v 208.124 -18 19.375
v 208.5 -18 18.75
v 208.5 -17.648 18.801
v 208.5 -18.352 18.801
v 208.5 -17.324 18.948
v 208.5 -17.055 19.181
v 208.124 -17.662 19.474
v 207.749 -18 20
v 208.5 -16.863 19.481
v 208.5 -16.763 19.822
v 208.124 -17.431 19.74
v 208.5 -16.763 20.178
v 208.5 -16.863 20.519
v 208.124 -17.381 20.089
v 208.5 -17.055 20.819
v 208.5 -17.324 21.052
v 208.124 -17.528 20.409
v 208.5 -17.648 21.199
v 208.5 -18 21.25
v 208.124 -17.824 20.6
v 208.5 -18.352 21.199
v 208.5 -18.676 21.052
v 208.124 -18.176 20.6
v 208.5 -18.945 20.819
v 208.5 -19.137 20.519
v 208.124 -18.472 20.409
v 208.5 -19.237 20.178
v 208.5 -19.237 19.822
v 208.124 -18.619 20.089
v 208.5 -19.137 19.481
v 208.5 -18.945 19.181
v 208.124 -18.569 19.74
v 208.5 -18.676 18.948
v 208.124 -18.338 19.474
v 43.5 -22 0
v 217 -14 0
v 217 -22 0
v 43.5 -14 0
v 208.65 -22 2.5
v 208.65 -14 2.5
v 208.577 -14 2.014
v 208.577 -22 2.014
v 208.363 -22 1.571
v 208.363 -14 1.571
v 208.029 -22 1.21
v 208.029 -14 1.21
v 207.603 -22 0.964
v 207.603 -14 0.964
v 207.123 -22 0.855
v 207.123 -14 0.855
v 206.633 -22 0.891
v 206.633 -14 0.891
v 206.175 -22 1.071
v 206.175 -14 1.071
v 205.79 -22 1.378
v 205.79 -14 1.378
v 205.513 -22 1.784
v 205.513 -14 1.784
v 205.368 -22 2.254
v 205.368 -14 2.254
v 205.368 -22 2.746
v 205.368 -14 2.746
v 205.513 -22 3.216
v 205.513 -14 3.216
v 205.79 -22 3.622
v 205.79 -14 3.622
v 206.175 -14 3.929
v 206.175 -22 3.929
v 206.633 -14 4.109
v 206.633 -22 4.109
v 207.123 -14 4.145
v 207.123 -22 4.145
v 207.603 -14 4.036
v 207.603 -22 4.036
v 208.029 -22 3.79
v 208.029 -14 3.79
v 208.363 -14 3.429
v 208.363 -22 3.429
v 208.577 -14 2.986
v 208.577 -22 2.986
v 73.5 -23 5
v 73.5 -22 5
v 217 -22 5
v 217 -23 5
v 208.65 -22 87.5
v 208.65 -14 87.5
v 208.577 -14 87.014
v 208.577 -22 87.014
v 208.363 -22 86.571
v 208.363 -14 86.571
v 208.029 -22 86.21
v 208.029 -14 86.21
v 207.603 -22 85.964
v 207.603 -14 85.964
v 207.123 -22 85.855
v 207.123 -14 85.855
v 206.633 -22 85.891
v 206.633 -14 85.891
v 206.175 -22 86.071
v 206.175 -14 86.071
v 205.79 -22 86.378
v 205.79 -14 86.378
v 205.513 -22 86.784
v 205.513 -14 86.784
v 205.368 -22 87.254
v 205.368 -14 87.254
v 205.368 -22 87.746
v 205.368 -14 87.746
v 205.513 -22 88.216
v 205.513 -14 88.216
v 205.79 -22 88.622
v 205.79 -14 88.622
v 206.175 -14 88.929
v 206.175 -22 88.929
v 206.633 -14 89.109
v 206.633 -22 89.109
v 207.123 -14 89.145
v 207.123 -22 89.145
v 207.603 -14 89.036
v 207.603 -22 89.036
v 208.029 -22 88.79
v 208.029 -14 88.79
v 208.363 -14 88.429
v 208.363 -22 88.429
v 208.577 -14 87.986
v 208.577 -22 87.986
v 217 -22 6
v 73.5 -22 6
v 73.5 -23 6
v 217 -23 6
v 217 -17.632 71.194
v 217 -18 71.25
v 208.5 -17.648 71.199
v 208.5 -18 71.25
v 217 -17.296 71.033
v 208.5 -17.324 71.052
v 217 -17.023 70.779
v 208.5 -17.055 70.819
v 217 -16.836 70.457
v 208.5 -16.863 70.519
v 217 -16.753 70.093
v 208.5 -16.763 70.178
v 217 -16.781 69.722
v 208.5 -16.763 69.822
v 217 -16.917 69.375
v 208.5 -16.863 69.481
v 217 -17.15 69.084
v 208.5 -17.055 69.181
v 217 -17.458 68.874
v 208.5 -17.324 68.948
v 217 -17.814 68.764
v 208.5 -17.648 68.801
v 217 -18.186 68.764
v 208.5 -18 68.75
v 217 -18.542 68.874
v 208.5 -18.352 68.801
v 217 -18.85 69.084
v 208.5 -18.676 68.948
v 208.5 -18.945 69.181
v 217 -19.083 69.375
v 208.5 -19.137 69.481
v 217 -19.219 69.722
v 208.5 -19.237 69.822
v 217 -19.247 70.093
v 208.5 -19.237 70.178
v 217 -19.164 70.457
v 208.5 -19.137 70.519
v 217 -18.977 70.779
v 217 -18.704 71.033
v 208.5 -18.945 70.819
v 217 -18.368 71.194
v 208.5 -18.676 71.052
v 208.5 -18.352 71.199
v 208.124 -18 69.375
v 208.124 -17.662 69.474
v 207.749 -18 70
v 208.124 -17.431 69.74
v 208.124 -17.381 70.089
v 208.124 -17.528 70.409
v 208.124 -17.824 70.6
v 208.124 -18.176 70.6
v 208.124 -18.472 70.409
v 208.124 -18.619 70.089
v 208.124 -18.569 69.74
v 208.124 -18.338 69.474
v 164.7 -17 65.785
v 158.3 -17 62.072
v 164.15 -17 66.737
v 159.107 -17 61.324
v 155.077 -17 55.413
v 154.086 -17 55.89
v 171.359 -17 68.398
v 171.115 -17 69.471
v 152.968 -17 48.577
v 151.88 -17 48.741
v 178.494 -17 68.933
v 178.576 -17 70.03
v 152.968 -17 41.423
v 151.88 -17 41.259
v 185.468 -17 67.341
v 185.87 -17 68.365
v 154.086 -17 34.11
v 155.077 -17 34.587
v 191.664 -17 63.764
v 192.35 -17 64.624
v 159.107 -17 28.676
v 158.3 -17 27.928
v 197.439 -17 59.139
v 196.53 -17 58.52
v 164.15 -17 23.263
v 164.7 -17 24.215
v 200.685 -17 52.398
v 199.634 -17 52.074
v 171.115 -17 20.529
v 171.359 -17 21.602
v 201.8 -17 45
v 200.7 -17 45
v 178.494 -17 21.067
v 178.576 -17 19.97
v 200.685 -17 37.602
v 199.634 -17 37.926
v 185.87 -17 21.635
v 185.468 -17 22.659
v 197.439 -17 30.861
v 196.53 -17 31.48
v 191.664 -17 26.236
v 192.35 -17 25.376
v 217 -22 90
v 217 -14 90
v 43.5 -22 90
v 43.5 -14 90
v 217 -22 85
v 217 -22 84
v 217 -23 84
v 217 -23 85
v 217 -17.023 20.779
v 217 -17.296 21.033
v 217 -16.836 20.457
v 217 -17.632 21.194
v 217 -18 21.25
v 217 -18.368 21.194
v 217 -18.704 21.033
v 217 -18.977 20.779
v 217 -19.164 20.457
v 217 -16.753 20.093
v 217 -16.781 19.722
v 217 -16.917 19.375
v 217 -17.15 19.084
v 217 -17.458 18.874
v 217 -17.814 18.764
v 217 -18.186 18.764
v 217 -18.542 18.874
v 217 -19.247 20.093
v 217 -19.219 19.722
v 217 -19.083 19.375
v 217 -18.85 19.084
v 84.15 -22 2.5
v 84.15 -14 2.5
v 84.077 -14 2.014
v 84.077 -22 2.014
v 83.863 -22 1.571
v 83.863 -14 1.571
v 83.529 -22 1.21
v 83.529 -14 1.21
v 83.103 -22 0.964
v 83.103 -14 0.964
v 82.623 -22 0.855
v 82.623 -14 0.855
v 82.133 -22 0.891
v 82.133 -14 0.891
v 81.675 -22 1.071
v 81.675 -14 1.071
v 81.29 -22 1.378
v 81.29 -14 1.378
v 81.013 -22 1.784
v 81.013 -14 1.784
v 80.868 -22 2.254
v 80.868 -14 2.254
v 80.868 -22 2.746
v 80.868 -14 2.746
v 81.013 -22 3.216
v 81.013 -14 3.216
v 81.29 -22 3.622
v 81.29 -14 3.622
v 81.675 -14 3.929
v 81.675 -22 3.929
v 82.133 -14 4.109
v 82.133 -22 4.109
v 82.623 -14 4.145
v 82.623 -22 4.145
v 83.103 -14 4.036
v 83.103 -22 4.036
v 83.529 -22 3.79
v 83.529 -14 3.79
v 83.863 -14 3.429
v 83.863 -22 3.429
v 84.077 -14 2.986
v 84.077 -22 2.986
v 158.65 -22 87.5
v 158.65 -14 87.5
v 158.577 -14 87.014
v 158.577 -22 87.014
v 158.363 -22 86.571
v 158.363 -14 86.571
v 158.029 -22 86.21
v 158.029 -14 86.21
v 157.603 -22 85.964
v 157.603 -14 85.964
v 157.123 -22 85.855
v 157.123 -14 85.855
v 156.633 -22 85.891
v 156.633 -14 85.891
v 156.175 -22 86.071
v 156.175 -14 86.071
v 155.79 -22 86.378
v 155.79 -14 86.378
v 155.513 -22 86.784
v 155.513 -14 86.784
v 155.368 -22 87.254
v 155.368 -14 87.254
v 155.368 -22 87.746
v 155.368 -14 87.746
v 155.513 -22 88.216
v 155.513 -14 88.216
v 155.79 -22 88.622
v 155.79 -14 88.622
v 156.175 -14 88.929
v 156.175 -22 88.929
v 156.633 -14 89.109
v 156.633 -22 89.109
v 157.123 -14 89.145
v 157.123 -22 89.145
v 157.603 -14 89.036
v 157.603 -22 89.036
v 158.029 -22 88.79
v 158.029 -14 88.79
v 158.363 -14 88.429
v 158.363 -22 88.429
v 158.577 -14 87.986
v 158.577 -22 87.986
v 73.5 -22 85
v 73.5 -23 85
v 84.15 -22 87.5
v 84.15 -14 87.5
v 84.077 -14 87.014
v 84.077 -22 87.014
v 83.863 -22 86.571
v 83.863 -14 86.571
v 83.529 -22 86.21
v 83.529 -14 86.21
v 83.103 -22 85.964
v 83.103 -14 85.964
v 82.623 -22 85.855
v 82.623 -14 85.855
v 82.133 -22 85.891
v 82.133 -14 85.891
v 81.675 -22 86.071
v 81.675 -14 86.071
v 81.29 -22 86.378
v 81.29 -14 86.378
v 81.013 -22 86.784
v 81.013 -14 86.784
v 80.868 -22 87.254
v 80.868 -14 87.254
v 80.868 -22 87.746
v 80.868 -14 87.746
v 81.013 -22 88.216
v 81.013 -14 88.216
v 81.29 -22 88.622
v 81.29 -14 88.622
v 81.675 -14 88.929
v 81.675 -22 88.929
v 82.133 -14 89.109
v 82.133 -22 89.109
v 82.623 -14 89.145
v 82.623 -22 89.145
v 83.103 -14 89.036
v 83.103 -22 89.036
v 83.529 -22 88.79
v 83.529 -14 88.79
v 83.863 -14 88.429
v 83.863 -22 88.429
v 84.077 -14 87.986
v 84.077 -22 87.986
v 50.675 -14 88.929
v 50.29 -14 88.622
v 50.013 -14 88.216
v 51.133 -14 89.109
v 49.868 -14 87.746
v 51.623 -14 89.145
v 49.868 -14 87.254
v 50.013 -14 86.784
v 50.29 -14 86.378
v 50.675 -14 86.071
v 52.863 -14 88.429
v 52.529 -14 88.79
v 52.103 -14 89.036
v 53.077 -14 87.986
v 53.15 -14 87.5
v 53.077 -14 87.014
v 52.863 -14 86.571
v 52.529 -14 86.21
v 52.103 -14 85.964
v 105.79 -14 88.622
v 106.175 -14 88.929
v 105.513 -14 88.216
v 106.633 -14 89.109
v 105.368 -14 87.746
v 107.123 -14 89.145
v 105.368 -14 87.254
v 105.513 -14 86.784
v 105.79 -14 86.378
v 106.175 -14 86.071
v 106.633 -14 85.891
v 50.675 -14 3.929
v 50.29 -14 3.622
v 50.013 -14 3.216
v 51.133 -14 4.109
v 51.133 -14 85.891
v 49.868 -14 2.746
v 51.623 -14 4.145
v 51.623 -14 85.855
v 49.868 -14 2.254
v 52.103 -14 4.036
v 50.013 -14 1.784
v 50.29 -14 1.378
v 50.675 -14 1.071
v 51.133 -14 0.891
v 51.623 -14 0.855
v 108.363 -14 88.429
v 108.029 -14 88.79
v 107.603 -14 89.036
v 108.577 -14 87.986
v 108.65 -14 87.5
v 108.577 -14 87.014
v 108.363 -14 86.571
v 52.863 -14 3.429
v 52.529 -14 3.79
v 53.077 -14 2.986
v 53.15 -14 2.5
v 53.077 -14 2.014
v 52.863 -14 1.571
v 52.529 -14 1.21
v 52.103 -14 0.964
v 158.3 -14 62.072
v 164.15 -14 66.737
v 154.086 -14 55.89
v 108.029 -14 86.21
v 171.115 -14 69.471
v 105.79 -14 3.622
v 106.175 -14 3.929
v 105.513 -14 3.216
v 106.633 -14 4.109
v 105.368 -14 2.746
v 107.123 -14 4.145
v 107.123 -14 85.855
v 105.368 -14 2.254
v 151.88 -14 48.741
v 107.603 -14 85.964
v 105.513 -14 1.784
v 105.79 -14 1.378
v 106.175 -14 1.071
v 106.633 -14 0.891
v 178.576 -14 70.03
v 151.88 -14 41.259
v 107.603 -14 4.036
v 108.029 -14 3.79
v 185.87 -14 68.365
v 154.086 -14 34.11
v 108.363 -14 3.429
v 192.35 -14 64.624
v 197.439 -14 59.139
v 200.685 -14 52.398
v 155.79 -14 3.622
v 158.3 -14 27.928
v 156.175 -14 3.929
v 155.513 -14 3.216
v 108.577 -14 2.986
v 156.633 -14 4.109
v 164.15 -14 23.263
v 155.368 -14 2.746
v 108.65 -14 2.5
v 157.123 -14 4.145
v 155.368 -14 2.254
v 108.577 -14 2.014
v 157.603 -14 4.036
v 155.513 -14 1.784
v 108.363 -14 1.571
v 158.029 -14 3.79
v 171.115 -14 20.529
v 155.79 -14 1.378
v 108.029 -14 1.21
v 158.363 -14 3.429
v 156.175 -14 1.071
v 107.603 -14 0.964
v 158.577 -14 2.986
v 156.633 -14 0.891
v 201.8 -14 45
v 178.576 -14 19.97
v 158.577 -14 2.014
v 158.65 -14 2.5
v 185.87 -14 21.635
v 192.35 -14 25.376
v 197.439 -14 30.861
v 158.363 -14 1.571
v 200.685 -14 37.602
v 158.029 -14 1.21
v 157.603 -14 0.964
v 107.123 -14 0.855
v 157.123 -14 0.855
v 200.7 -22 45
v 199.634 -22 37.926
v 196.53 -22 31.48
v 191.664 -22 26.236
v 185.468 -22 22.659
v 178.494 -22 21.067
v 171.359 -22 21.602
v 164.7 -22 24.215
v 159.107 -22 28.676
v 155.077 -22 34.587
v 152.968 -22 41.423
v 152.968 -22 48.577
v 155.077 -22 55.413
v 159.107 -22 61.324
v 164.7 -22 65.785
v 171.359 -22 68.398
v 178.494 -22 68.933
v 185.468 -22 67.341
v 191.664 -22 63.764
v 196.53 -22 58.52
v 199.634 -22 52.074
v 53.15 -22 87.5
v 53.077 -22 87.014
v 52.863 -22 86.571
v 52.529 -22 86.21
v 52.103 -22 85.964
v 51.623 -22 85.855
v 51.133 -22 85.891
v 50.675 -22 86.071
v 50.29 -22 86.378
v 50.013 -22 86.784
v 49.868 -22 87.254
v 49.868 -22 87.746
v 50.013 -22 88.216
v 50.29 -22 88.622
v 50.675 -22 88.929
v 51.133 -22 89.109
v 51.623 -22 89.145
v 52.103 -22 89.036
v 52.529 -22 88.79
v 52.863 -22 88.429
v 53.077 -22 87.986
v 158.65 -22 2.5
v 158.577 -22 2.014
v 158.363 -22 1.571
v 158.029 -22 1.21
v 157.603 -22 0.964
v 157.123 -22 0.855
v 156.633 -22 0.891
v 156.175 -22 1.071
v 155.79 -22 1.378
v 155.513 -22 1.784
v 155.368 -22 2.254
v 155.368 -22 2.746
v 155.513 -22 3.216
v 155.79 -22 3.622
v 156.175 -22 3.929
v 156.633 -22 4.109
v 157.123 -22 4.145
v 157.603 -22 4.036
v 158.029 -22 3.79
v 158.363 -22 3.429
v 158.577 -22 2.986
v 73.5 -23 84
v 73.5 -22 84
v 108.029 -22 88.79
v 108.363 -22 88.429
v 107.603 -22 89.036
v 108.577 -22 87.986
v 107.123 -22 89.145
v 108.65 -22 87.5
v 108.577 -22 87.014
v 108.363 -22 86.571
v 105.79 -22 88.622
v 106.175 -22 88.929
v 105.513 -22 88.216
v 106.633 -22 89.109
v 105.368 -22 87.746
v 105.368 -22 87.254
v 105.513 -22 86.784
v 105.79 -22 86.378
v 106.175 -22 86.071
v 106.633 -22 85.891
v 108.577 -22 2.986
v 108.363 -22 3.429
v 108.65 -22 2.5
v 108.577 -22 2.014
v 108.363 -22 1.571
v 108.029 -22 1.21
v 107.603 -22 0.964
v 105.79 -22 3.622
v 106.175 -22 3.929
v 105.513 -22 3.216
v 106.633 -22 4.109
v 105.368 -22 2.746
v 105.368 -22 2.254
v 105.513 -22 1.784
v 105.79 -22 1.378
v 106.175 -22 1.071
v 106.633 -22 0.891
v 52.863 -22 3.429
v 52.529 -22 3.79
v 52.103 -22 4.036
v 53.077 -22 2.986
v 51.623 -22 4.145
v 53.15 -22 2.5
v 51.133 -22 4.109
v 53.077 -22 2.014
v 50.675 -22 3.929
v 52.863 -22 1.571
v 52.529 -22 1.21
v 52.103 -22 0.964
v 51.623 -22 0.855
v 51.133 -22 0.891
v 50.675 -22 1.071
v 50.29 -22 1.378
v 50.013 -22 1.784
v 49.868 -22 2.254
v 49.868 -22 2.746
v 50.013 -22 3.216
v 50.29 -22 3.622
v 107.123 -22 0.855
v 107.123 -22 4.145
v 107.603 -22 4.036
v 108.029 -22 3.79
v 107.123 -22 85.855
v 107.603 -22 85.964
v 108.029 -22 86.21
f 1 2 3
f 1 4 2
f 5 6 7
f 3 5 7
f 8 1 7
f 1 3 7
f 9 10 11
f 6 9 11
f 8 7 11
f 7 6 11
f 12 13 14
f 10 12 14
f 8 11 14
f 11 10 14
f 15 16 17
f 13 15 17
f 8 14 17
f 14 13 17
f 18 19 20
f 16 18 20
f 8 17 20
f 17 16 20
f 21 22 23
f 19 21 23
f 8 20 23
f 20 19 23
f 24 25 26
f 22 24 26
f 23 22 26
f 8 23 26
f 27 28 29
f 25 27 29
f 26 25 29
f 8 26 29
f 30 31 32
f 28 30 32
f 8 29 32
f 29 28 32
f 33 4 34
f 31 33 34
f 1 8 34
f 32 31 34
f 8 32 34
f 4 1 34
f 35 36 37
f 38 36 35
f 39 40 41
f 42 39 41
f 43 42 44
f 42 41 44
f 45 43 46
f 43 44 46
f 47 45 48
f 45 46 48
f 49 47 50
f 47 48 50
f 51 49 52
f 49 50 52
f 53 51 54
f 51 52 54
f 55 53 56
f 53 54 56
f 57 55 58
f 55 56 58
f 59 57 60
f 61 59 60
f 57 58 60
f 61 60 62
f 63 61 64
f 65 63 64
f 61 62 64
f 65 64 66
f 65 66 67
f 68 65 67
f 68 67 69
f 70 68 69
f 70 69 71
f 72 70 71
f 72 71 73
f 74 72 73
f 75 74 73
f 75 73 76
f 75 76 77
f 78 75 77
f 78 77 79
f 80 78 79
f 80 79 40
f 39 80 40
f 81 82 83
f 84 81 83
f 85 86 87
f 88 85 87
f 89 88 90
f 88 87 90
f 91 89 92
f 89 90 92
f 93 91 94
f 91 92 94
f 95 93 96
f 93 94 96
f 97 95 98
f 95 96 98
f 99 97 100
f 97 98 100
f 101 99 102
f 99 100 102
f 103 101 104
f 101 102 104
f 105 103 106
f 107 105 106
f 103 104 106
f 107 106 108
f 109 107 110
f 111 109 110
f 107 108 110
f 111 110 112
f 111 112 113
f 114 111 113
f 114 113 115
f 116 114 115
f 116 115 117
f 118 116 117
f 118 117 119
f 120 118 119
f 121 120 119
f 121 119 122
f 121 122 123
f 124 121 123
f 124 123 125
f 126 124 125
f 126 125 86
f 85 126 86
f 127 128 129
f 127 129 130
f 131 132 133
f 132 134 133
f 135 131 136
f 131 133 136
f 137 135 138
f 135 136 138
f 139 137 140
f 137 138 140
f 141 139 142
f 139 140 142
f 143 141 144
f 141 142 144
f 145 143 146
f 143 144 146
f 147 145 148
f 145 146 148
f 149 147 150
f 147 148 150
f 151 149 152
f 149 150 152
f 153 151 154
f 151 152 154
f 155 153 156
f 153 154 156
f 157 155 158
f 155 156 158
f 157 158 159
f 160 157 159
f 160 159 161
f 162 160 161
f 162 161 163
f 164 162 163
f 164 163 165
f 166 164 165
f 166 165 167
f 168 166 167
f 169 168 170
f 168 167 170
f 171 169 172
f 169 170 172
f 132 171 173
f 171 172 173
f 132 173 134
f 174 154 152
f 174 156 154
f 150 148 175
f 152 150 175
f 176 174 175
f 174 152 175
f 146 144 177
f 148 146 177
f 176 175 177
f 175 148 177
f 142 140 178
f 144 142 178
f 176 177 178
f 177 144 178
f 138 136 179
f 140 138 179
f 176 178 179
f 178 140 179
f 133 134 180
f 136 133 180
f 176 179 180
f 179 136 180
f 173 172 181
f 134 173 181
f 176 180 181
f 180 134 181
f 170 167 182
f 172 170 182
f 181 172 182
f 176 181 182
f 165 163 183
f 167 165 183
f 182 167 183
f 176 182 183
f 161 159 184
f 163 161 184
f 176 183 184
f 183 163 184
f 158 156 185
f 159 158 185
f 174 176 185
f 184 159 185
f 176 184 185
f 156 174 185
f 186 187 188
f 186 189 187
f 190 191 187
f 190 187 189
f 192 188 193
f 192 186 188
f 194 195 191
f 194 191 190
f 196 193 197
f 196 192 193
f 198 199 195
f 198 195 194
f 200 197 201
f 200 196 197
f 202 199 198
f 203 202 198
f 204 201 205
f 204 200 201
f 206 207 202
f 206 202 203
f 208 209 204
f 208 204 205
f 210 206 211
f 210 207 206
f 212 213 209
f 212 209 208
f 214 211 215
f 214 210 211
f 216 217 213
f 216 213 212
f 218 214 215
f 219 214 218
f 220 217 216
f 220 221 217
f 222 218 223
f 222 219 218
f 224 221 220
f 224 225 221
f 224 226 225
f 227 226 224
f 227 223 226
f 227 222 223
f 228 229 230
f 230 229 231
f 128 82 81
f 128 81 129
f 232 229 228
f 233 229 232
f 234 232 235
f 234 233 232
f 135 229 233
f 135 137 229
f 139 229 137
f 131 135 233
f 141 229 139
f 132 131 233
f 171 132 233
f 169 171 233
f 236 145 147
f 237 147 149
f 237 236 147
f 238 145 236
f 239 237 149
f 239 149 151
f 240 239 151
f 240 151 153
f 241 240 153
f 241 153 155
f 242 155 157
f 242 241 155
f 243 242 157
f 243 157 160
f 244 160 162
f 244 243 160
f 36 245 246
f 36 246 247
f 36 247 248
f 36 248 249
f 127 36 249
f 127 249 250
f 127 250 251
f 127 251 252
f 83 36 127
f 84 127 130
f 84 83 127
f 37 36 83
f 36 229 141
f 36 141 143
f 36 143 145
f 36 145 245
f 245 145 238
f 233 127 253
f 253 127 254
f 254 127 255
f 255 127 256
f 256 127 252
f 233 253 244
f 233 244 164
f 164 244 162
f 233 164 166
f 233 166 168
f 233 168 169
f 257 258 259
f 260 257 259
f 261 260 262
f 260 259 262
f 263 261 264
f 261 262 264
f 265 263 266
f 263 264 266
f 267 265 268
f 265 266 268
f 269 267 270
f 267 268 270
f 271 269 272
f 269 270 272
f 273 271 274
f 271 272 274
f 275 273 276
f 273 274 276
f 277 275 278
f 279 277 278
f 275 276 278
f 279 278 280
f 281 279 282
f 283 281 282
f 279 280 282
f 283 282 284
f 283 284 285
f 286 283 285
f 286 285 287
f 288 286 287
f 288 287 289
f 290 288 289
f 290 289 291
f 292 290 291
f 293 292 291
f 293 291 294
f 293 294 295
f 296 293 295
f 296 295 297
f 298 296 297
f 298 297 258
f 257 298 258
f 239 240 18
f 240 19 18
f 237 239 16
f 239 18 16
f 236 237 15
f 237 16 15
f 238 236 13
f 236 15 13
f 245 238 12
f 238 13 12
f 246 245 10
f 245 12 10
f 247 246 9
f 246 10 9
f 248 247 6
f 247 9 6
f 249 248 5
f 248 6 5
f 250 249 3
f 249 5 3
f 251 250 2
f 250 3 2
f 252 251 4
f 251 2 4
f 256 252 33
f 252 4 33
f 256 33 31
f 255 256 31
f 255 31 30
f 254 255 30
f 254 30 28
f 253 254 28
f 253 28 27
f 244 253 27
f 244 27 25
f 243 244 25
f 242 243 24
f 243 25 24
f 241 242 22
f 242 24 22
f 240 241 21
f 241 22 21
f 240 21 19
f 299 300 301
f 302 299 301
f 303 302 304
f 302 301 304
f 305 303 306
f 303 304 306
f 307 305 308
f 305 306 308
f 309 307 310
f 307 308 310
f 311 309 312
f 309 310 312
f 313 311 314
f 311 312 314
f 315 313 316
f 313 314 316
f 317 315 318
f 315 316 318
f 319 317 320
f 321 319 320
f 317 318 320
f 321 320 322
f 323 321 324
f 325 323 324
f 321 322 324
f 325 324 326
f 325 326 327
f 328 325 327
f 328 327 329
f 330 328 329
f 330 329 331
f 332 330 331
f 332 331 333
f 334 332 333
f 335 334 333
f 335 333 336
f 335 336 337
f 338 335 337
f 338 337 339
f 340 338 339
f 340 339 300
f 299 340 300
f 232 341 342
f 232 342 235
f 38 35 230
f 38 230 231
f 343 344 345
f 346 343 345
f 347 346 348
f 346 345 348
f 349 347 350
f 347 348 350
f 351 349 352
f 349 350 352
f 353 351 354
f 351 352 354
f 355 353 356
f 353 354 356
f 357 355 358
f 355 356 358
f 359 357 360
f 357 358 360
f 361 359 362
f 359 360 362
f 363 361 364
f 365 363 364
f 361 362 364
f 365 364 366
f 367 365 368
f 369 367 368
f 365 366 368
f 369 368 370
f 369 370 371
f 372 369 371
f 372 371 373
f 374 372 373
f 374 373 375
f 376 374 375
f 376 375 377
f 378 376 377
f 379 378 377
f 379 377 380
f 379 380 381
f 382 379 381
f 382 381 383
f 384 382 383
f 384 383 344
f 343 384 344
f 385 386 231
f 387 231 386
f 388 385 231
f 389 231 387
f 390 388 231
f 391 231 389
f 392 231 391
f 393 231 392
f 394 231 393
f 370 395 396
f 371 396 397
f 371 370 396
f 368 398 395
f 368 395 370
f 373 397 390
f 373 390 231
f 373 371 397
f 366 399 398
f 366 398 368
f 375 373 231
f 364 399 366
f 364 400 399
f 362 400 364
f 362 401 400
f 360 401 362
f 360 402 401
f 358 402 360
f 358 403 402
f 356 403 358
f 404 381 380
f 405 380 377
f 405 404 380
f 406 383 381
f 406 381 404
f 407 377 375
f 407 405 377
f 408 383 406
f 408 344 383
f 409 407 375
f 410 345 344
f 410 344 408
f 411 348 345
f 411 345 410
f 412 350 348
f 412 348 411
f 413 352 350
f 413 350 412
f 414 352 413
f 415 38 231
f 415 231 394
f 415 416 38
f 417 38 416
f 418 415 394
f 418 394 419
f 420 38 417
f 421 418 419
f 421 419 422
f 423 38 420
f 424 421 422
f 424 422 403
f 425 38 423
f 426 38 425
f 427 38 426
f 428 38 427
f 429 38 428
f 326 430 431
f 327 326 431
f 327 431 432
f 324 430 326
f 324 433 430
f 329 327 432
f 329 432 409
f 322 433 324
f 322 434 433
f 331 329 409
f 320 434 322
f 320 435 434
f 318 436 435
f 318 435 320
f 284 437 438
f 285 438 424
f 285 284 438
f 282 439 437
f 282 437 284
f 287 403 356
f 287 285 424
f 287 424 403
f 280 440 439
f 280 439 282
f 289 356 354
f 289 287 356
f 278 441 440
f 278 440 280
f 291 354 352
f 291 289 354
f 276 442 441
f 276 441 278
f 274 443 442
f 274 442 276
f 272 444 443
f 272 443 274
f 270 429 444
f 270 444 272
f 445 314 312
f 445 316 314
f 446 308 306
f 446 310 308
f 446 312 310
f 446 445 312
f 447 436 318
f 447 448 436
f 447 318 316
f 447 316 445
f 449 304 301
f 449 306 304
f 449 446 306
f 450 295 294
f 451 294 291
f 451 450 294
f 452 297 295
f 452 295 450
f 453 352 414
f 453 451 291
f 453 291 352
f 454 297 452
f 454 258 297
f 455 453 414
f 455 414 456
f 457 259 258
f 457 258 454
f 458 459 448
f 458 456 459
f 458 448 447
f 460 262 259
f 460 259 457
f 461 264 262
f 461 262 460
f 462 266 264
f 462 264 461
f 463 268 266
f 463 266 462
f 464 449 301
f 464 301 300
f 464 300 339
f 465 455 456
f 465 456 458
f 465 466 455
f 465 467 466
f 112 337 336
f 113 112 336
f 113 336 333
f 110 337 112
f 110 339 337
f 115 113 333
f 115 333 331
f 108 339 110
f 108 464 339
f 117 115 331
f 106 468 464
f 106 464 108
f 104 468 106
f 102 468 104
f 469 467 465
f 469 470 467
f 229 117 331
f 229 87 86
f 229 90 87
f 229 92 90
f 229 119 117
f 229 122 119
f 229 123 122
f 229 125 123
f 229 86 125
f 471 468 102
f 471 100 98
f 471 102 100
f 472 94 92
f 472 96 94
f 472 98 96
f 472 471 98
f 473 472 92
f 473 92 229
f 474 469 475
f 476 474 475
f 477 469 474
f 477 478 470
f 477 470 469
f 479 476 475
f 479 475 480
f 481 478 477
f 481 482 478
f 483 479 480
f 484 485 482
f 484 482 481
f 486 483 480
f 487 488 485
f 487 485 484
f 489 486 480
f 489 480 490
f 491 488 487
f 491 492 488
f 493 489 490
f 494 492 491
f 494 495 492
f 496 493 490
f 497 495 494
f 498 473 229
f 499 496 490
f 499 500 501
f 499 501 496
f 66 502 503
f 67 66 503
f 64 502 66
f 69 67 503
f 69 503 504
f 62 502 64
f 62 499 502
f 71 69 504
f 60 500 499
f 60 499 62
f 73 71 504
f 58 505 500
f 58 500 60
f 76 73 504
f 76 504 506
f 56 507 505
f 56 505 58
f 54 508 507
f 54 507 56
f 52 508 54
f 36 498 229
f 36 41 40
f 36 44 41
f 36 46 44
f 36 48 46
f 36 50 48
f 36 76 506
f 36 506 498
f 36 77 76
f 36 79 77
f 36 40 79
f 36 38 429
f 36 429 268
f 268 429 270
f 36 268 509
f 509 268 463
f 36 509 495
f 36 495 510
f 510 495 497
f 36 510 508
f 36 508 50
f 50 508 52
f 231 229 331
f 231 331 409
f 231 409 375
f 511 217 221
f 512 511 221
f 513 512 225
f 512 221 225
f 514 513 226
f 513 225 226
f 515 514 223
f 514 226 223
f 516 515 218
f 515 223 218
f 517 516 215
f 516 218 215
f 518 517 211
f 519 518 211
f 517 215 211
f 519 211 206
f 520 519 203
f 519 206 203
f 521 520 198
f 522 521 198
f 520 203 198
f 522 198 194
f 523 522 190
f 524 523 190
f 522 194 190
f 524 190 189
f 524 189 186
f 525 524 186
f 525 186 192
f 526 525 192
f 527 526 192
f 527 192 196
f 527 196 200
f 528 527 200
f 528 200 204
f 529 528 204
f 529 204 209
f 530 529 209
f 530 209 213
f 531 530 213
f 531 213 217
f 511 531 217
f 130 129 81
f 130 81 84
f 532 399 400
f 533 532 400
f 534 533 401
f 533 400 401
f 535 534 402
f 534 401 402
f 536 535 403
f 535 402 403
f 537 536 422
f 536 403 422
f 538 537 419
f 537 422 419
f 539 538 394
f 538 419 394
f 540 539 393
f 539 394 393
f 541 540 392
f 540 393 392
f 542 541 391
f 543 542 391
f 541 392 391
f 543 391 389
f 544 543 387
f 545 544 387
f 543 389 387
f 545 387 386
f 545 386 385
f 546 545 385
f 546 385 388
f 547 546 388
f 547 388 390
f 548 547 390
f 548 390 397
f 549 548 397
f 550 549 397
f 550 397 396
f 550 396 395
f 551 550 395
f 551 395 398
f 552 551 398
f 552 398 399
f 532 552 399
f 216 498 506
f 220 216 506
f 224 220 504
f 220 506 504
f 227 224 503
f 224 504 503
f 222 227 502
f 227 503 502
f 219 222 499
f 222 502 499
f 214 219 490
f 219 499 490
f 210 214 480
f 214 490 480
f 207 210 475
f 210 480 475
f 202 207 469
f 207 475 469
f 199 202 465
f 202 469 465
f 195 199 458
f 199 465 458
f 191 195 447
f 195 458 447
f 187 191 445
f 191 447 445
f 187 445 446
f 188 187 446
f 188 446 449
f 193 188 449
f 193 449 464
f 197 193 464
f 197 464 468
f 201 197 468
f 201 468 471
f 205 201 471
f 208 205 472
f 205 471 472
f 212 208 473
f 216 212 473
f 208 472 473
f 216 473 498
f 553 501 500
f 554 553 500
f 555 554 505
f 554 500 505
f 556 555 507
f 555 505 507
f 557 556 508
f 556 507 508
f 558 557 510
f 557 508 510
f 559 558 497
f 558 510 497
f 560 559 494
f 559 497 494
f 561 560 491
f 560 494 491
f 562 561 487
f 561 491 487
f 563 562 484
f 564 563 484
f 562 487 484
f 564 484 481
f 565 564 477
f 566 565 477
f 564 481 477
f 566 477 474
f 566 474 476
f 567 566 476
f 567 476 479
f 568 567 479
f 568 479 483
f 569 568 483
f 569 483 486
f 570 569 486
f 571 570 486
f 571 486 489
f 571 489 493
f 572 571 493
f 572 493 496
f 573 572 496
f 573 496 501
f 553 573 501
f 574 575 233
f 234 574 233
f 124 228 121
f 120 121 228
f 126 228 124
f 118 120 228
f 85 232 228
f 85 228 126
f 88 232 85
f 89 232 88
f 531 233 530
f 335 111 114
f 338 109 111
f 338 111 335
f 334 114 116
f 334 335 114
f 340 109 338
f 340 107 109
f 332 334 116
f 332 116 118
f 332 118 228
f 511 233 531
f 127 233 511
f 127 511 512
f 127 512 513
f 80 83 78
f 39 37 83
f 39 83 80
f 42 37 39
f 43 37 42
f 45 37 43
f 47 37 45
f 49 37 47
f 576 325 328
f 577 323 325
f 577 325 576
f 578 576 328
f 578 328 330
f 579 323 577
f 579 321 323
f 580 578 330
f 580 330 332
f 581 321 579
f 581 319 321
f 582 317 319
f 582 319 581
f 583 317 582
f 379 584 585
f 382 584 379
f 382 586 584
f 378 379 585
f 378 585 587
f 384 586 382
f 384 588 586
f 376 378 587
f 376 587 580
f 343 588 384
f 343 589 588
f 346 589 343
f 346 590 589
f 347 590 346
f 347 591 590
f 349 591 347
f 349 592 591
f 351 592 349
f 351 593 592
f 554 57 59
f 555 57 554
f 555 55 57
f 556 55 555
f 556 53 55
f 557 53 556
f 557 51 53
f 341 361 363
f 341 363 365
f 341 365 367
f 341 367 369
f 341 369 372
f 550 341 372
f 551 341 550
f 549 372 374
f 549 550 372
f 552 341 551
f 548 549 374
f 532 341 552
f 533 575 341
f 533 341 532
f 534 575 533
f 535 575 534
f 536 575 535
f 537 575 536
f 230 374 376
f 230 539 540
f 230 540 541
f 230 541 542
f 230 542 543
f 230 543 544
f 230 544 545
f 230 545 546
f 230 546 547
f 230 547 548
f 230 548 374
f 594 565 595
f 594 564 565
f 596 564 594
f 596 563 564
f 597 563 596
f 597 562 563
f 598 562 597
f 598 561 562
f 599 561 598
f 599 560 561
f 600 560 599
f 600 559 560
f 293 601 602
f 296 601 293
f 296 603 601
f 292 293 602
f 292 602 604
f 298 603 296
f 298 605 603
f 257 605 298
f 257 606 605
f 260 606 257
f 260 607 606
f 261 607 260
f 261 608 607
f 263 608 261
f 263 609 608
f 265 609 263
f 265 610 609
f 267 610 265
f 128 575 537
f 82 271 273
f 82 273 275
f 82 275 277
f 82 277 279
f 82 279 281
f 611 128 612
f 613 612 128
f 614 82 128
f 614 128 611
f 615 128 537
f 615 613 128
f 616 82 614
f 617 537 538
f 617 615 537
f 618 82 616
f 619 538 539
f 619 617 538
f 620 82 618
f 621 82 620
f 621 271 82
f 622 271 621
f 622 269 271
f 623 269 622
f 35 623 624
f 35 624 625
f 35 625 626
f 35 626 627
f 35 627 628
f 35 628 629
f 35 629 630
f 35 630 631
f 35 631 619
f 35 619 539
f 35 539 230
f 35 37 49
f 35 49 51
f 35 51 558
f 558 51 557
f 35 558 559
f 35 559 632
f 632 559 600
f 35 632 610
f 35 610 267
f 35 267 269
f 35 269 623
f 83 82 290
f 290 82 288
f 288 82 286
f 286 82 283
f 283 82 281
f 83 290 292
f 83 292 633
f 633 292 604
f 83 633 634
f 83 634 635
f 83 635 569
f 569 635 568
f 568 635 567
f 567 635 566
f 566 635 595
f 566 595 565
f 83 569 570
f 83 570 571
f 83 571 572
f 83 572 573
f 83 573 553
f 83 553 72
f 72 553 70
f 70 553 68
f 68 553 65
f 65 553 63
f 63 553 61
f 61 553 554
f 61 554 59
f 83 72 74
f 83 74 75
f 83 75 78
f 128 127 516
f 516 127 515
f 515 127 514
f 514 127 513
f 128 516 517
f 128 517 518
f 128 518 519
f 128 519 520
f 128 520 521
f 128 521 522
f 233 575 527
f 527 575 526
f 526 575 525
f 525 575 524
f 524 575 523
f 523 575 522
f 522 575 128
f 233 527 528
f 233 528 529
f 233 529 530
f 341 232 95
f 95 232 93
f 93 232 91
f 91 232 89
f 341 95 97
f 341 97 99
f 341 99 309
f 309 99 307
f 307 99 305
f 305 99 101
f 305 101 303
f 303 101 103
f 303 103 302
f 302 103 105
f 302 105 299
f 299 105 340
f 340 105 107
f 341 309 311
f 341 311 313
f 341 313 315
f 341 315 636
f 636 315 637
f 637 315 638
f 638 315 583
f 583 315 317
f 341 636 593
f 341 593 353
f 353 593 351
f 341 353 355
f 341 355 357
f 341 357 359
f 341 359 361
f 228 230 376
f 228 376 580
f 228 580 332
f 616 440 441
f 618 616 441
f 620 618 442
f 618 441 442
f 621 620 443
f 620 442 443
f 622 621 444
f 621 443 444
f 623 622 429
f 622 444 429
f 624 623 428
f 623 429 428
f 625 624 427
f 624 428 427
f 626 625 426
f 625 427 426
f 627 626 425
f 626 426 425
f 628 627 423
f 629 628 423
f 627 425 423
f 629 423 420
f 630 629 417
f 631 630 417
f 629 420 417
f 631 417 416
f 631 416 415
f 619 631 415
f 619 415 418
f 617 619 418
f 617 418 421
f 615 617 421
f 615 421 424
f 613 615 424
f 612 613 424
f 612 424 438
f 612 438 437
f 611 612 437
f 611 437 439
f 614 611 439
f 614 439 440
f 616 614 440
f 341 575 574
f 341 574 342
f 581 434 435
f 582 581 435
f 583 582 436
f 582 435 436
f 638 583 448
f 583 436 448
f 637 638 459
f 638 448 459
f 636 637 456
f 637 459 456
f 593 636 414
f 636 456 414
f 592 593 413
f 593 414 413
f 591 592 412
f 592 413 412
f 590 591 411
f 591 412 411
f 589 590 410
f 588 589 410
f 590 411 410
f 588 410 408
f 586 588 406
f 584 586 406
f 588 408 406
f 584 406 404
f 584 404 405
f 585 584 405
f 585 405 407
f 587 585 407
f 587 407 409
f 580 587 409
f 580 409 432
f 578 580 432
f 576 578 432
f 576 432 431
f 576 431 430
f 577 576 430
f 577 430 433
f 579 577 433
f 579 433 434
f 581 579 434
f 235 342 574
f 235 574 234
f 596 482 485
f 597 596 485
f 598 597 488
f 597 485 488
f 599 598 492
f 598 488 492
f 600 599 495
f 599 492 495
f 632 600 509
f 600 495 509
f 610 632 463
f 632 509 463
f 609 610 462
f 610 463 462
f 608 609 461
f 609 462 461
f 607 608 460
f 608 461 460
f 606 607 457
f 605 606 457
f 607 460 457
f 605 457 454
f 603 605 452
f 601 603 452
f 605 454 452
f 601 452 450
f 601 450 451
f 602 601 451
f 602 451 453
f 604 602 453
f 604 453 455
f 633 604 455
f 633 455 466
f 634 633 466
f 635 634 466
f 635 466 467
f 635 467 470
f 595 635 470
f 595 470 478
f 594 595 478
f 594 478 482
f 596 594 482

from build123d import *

# Parameters (mm, degrees)
BOSS_EXTRUDE1_DEPTH   = 90
SKETCH2_R             = 24
CUT_EXTRUDE1_DEPTH    = 9
SKETCH3_R             = 25.1
CUT_EXTRUDE2_DEPTH    = 3
SKETCH4_W             = 143.5
SKETCH4_H             = 1
BOSS_EXTRUDE2_DEPTH   = 1
SKETCH5_W             = 10
SKETCH5_H             = 1
BOSS_EXTRUDE3_DEPTH   = 2
SKETCH6_R             = 1.65
CUT_EXTRUDE3_DEPTH    = 39
M3_TAPPED_HOLE1_D     = 2.5
M3_TAPPED_HOLE1_DEPTH = 8.5
M3_TAPPED_HOLE1_TIP   = 0.751075774
SKETCH_1_W            = 53.5
SKETCH_1_H            = 19
CUT_EXTRUDE_1_DEPTH   = 90


with BuildPart() as part:
    # Sketch1 → Boss-Extrude1 (new body)
    with BuildSketch(Plane.XY):
        Polygon((0, 0), (0, 5), (53.5, 5), (53.5, -14), (217, -14), (217, -22), (43.5, -22), (43.5, 0), align=None)
    extrude(amount=BOSS_EXTRUDE1_DEPTH)

    # Sketch2 → Cut-Extrude1 (cut, through all)
    with BuildSketch(Plane(origin=(0, -14, 0), x_dir=(1, 0, 0), z_dir=(0, 1, 0))):
        with Locations((176.7, -45)):
            Circle(SKETCH2_R)
    extrude(amount=-CUT_EXTRUDE1_DEPTH, mode=Mode.SUBTRACT)

    # Sketch3 → Cut-Extrude2 (cut)
    with BuildSketch(Plane(origin=(0, -14, 0), x_dir=(1, 0, 0), z_dir=(0, 1, 0))):
        with Locations((176.7, -45)):
            Circle(SKETCH3_R)
    extrude(amount=-CUT_EXTRUDE2_DEPTH, mode=Mode.SUBTRACT)

    # Sketch4 → Boss-Extrude2 (add)
    with BuildSketch(Plane.XZ.offset(22)):
        with Locations((145.25, 84.5)):
            Rectangle(SKETCH4_W, SKETCH4_H)
        with Locations((145.25, 5.5)):
            Rectangle(SKETCH4_W, SKETCH4_H)
    extrude(amount=BOSS_EXTRUDE2_DEPTH)

    # Sketch5 → Boss-Extrude3 (add)
    with BuildSketch(Plane.XZ):
        with Locations((28.5, 84.5)):
            Rectangle(SKETCH5_W, SKETCH5_H)
        with Locations((28.5, 5.5)):
            Rectangle(SKETCH5_W, SKETCH5_H)
    extrude(amount=BOSS_EXTRUDE3_DEPTH)

    # Sketch6 → Cut-Extrude3 (cut, through all)
    with BuildSketch(Plane(origin=(0, 15, 0), x_dir=(1, 0, 0), z_dir=(0, 1, 0))):
        with Locations((51.5, -2.5)):
            Circle(SKETCH6_R)
        with Locations((82.5, -2.5)):
            Circle(SKETCH6_R)
        with Locations((51.5, -87.5)):
            Circle(SKETCH6_R)
        with Locations((82.5, -87.5)):
            Circle(SKETCH6_R)
        with Locations((107, -87.5)):
            Circle(SKETCH6_R)
        with Locations((157, -87.5)):
            Circle(SKETCH6_R)
        with Locations((207, -87.5)):
            Circle(SKETCH6_R)
        with Locations((107, -2.5)):
            Circle(SKETCH6_R)
        with Locations((157, -2.5)):
            Circle(SKETCH6_R)
        with Locations((207, -2.5)):
            Circle(SKETCH6_R)
    extrude(amount=-CUT_EXTRUDE3_DEPTH, mode=Mode.SUBTRACT)

    # M3 Tapped Hole1
    with Locations(Plane(origin=(217, 0, 0), x_dir=(0, 0, -1), z_dir=(1, 0, 0))):
        with Locations((-70, -18), (-20, -18)):
            Hole(M3_TAPPED_HOLE1_D / 2, depth=M3_TAPPED_HOLE1_DEPTH)
            with Locations((0, 0, -(M3_TAPPED_HOLE1_DEPTH + M3_TAPPED_HOLE1_TIP / 2))):  # 118° drill point
                Cone(0, M3_TAPPED_HOLE1_D / 2, M3_TAPPED_HOLE1_TIP, mode=Mode.SUBTRACT)

    # 草图1 → 切除-拉伸1 (cut)
    with BuildSketch(Plane.XY.offset(90)):
        with Locations((26.75, -4.5)):
            Rectangle(SKETCH_1_W, SKETCH_1_H)
    extrude(amount=-CUT_EXTRUDE_1_DEPTH, mode=Mode.SUBTRACT)


solid = part.part
